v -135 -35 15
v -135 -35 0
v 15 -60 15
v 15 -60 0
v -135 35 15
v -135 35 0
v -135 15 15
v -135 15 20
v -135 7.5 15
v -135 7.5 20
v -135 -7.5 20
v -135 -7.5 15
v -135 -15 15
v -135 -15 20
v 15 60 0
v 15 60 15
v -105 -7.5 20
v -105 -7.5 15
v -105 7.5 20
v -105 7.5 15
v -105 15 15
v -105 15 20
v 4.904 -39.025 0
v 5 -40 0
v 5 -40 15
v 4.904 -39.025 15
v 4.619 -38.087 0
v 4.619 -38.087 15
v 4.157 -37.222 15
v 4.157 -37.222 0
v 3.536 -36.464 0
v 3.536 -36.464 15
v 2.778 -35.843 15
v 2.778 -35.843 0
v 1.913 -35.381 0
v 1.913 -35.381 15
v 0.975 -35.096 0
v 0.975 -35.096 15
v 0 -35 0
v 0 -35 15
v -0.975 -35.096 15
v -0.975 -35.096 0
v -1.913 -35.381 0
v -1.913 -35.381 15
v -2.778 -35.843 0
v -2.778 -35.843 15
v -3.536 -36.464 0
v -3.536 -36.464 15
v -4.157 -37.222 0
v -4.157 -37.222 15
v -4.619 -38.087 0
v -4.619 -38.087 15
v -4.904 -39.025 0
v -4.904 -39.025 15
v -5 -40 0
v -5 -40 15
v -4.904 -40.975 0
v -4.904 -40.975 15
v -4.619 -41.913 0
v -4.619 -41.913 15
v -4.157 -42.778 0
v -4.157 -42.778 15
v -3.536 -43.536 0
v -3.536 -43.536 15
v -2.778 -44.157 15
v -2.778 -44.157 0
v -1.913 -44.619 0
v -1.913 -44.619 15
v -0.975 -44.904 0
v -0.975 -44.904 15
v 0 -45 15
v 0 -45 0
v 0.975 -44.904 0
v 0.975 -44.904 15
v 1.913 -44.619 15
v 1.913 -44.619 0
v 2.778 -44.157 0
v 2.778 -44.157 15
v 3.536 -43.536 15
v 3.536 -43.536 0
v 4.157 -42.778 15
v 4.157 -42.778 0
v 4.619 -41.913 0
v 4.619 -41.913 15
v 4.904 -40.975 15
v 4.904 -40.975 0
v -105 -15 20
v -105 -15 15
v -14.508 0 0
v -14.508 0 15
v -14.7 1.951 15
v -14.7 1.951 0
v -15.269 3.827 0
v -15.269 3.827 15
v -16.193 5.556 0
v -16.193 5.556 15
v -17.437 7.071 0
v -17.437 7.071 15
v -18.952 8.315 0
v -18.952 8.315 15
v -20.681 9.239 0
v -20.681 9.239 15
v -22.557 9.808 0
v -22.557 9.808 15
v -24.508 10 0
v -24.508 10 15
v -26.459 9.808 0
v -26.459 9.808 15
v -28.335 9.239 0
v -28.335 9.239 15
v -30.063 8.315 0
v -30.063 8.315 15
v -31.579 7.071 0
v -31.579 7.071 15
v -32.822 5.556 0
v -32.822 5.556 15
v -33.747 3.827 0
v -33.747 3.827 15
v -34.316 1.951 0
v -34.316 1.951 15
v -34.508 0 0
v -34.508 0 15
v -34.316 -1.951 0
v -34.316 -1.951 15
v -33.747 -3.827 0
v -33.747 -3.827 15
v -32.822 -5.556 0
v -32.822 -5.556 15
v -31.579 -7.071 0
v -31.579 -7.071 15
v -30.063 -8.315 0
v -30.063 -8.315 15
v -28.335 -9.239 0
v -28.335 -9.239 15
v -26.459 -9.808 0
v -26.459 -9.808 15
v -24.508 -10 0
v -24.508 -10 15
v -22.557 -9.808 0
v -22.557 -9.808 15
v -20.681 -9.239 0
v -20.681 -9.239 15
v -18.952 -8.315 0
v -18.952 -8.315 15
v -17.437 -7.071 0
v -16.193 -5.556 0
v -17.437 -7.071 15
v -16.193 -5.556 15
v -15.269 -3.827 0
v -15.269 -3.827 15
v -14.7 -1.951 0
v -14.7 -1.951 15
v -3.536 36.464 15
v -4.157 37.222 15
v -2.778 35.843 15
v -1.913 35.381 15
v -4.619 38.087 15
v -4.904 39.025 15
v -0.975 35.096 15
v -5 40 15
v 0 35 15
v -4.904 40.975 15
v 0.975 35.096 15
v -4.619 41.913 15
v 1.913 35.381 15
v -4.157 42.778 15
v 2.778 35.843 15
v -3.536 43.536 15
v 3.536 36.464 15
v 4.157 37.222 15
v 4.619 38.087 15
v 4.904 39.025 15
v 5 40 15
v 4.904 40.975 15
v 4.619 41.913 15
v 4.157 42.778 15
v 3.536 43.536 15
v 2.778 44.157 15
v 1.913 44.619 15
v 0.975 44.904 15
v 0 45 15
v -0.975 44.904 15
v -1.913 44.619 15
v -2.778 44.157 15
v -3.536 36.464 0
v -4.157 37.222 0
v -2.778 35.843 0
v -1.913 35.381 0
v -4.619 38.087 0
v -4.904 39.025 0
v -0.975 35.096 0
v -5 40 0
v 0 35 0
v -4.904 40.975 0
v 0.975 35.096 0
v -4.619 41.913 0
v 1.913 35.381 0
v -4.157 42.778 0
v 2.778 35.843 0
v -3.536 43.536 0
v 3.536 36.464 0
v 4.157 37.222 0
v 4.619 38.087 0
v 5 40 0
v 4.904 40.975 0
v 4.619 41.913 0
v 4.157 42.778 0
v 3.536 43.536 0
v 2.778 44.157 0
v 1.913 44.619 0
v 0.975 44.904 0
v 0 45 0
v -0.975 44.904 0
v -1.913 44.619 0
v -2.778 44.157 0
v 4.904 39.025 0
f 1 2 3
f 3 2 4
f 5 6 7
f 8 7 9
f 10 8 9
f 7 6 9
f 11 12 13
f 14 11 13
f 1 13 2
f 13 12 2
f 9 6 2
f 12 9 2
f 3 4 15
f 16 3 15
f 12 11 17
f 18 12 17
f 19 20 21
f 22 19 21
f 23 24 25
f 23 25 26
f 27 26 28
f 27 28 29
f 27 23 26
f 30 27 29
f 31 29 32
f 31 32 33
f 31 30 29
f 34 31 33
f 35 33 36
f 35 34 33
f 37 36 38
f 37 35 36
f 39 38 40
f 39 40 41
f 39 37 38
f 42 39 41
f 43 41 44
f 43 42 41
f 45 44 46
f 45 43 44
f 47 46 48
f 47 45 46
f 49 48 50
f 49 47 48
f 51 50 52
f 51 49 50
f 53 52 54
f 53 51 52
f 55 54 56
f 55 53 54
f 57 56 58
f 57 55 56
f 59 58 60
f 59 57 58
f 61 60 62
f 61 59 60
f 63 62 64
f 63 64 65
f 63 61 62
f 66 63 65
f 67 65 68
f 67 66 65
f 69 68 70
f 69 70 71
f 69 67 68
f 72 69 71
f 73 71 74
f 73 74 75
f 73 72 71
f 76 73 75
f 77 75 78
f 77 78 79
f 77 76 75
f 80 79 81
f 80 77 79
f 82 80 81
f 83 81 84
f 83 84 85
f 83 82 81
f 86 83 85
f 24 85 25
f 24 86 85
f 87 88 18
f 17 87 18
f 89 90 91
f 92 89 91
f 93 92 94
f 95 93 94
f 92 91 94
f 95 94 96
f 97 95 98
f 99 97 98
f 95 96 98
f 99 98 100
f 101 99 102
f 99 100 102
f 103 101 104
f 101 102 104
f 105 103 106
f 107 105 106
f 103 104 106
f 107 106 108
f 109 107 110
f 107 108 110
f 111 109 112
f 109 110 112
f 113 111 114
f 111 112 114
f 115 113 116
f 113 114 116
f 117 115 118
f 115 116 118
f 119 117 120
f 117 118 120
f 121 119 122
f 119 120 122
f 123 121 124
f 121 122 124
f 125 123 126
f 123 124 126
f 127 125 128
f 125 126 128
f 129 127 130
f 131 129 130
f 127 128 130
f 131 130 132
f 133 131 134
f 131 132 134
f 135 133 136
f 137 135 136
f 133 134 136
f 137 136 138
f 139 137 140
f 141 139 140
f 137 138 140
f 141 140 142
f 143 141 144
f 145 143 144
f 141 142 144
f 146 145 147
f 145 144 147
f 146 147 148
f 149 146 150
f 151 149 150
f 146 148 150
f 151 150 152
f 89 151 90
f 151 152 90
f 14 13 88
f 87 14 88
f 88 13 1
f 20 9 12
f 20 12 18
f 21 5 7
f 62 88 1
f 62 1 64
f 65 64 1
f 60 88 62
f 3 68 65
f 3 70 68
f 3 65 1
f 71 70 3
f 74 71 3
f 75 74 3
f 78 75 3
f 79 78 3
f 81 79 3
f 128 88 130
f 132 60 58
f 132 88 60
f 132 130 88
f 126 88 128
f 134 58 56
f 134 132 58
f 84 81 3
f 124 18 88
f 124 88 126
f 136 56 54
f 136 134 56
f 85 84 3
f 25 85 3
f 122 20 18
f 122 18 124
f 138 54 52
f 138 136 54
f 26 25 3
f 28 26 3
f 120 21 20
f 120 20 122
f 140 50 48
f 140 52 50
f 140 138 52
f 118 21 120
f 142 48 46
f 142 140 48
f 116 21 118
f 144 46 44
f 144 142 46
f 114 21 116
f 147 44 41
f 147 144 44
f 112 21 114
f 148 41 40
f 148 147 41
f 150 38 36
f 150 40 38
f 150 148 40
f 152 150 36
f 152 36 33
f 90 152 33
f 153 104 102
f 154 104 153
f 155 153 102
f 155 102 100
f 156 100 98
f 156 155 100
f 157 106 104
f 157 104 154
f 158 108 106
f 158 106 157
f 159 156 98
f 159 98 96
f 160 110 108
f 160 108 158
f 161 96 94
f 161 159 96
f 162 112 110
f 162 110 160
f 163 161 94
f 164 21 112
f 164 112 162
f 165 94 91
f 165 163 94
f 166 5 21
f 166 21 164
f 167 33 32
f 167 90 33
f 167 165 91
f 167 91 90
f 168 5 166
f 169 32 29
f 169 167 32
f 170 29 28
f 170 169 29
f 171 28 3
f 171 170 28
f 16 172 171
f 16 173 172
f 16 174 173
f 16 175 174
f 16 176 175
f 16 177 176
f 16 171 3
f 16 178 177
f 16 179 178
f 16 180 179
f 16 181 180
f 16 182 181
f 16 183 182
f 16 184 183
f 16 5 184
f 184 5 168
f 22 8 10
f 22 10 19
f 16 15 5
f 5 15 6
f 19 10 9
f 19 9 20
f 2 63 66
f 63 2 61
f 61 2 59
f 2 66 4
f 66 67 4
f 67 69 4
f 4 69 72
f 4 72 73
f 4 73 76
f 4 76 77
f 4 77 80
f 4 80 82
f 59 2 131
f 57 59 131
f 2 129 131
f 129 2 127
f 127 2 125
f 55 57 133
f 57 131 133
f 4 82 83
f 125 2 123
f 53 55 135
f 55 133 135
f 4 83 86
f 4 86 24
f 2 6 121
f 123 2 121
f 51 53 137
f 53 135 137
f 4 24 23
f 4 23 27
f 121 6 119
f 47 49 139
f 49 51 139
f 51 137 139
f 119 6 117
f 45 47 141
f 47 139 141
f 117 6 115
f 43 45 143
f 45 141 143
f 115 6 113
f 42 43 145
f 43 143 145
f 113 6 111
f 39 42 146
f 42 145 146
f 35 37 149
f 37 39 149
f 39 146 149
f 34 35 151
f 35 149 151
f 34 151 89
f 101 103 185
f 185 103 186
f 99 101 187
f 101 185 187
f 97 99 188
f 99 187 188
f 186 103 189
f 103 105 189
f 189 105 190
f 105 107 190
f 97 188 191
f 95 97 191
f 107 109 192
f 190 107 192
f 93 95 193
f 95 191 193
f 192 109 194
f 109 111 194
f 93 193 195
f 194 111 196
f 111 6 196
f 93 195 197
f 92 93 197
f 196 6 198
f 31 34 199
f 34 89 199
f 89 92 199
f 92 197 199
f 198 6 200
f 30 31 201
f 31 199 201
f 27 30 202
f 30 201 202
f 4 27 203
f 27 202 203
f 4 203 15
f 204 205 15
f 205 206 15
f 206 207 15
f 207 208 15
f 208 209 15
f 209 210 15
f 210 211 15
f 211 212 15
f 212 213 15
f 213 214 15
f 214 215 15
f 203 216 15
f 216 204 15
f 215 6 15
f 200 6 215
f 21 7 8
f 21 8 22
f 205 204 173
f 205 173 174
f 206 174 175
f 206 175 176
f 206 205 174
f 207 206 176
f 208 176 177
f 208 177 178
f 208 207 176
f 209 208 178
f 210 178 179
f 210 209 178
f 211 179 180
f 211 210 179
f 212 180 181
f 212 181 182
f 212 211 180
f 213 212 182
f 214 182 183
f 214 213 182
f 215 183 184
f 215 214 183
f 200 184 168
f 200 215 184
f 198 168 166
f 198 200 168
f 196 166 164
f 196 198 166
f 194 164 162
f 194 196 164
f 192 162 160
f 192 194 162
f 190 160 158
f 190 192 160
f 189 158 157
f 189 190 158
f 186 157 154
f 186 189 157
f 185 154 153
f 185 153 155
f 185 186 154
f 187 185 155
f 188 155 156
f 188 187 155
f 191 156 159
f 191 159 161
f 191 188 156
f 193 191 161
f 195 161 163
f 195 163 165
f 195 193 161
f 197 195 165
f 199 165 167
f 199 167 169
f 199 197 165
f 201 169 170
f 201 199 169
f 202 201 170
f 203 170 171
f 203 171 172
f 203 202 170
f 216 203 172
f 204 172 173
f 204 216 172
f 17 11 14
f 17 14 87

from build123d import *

# Parameters (mm, degrees)
F0_R     = 5
F1_DEPTH = 15
F2_W     = 30
F2_H     = 30
F3_DEPTH = 5
F4_W     = 30
F4_H     = 15
F5_DEPTH = 5
F6_R     = 10
F7_DEPTH = 15


with BuildPart() as f1:
    # F0 (on Top) → F1 (new body)
    with BuildSketch(Plane.XY):
        Polygon((-135, 0), (-135, -35), (15, -60), (15, 0), (15, 60), (-135, 35), align=None)
        with Locations((0, -40)):
            Circle(F0_R, mode=Mode.SUBTRACT)
        with Locations((0, 40)):
            Circle(F0_R, mode=Mode.SUBTRACT)
    extrude(amount=F1_DEPTH)

    # F2 (on face) → F3 (join)
    with BuildSketch(Plane.XY.offset(15)):
        with Locations((-120, 0)):
            Rectangle(F2_W, F2_H)
    extrude(amount=F3_DEPTH)

    # F4 (on face) → F5 (cut)
    with BuildSketch(Plane.XY.offset(20)):
        with Locations((-120, 0)):
            Rectangle(F4_W, F4_H)
    extrude(amount=-F5_DEPTH, mode=Mode.SUBTRACT)

    # F6 (on face) → F7 (cut)
    with BuildSketch(Plane.XY.offset(15)):
        with Locations((-24.507769, 0)):
            Circle(F6_R)
    extrude(amount=-F7_DEPTH, mode=Mode.SUBTRACT)


solid = f1.part
